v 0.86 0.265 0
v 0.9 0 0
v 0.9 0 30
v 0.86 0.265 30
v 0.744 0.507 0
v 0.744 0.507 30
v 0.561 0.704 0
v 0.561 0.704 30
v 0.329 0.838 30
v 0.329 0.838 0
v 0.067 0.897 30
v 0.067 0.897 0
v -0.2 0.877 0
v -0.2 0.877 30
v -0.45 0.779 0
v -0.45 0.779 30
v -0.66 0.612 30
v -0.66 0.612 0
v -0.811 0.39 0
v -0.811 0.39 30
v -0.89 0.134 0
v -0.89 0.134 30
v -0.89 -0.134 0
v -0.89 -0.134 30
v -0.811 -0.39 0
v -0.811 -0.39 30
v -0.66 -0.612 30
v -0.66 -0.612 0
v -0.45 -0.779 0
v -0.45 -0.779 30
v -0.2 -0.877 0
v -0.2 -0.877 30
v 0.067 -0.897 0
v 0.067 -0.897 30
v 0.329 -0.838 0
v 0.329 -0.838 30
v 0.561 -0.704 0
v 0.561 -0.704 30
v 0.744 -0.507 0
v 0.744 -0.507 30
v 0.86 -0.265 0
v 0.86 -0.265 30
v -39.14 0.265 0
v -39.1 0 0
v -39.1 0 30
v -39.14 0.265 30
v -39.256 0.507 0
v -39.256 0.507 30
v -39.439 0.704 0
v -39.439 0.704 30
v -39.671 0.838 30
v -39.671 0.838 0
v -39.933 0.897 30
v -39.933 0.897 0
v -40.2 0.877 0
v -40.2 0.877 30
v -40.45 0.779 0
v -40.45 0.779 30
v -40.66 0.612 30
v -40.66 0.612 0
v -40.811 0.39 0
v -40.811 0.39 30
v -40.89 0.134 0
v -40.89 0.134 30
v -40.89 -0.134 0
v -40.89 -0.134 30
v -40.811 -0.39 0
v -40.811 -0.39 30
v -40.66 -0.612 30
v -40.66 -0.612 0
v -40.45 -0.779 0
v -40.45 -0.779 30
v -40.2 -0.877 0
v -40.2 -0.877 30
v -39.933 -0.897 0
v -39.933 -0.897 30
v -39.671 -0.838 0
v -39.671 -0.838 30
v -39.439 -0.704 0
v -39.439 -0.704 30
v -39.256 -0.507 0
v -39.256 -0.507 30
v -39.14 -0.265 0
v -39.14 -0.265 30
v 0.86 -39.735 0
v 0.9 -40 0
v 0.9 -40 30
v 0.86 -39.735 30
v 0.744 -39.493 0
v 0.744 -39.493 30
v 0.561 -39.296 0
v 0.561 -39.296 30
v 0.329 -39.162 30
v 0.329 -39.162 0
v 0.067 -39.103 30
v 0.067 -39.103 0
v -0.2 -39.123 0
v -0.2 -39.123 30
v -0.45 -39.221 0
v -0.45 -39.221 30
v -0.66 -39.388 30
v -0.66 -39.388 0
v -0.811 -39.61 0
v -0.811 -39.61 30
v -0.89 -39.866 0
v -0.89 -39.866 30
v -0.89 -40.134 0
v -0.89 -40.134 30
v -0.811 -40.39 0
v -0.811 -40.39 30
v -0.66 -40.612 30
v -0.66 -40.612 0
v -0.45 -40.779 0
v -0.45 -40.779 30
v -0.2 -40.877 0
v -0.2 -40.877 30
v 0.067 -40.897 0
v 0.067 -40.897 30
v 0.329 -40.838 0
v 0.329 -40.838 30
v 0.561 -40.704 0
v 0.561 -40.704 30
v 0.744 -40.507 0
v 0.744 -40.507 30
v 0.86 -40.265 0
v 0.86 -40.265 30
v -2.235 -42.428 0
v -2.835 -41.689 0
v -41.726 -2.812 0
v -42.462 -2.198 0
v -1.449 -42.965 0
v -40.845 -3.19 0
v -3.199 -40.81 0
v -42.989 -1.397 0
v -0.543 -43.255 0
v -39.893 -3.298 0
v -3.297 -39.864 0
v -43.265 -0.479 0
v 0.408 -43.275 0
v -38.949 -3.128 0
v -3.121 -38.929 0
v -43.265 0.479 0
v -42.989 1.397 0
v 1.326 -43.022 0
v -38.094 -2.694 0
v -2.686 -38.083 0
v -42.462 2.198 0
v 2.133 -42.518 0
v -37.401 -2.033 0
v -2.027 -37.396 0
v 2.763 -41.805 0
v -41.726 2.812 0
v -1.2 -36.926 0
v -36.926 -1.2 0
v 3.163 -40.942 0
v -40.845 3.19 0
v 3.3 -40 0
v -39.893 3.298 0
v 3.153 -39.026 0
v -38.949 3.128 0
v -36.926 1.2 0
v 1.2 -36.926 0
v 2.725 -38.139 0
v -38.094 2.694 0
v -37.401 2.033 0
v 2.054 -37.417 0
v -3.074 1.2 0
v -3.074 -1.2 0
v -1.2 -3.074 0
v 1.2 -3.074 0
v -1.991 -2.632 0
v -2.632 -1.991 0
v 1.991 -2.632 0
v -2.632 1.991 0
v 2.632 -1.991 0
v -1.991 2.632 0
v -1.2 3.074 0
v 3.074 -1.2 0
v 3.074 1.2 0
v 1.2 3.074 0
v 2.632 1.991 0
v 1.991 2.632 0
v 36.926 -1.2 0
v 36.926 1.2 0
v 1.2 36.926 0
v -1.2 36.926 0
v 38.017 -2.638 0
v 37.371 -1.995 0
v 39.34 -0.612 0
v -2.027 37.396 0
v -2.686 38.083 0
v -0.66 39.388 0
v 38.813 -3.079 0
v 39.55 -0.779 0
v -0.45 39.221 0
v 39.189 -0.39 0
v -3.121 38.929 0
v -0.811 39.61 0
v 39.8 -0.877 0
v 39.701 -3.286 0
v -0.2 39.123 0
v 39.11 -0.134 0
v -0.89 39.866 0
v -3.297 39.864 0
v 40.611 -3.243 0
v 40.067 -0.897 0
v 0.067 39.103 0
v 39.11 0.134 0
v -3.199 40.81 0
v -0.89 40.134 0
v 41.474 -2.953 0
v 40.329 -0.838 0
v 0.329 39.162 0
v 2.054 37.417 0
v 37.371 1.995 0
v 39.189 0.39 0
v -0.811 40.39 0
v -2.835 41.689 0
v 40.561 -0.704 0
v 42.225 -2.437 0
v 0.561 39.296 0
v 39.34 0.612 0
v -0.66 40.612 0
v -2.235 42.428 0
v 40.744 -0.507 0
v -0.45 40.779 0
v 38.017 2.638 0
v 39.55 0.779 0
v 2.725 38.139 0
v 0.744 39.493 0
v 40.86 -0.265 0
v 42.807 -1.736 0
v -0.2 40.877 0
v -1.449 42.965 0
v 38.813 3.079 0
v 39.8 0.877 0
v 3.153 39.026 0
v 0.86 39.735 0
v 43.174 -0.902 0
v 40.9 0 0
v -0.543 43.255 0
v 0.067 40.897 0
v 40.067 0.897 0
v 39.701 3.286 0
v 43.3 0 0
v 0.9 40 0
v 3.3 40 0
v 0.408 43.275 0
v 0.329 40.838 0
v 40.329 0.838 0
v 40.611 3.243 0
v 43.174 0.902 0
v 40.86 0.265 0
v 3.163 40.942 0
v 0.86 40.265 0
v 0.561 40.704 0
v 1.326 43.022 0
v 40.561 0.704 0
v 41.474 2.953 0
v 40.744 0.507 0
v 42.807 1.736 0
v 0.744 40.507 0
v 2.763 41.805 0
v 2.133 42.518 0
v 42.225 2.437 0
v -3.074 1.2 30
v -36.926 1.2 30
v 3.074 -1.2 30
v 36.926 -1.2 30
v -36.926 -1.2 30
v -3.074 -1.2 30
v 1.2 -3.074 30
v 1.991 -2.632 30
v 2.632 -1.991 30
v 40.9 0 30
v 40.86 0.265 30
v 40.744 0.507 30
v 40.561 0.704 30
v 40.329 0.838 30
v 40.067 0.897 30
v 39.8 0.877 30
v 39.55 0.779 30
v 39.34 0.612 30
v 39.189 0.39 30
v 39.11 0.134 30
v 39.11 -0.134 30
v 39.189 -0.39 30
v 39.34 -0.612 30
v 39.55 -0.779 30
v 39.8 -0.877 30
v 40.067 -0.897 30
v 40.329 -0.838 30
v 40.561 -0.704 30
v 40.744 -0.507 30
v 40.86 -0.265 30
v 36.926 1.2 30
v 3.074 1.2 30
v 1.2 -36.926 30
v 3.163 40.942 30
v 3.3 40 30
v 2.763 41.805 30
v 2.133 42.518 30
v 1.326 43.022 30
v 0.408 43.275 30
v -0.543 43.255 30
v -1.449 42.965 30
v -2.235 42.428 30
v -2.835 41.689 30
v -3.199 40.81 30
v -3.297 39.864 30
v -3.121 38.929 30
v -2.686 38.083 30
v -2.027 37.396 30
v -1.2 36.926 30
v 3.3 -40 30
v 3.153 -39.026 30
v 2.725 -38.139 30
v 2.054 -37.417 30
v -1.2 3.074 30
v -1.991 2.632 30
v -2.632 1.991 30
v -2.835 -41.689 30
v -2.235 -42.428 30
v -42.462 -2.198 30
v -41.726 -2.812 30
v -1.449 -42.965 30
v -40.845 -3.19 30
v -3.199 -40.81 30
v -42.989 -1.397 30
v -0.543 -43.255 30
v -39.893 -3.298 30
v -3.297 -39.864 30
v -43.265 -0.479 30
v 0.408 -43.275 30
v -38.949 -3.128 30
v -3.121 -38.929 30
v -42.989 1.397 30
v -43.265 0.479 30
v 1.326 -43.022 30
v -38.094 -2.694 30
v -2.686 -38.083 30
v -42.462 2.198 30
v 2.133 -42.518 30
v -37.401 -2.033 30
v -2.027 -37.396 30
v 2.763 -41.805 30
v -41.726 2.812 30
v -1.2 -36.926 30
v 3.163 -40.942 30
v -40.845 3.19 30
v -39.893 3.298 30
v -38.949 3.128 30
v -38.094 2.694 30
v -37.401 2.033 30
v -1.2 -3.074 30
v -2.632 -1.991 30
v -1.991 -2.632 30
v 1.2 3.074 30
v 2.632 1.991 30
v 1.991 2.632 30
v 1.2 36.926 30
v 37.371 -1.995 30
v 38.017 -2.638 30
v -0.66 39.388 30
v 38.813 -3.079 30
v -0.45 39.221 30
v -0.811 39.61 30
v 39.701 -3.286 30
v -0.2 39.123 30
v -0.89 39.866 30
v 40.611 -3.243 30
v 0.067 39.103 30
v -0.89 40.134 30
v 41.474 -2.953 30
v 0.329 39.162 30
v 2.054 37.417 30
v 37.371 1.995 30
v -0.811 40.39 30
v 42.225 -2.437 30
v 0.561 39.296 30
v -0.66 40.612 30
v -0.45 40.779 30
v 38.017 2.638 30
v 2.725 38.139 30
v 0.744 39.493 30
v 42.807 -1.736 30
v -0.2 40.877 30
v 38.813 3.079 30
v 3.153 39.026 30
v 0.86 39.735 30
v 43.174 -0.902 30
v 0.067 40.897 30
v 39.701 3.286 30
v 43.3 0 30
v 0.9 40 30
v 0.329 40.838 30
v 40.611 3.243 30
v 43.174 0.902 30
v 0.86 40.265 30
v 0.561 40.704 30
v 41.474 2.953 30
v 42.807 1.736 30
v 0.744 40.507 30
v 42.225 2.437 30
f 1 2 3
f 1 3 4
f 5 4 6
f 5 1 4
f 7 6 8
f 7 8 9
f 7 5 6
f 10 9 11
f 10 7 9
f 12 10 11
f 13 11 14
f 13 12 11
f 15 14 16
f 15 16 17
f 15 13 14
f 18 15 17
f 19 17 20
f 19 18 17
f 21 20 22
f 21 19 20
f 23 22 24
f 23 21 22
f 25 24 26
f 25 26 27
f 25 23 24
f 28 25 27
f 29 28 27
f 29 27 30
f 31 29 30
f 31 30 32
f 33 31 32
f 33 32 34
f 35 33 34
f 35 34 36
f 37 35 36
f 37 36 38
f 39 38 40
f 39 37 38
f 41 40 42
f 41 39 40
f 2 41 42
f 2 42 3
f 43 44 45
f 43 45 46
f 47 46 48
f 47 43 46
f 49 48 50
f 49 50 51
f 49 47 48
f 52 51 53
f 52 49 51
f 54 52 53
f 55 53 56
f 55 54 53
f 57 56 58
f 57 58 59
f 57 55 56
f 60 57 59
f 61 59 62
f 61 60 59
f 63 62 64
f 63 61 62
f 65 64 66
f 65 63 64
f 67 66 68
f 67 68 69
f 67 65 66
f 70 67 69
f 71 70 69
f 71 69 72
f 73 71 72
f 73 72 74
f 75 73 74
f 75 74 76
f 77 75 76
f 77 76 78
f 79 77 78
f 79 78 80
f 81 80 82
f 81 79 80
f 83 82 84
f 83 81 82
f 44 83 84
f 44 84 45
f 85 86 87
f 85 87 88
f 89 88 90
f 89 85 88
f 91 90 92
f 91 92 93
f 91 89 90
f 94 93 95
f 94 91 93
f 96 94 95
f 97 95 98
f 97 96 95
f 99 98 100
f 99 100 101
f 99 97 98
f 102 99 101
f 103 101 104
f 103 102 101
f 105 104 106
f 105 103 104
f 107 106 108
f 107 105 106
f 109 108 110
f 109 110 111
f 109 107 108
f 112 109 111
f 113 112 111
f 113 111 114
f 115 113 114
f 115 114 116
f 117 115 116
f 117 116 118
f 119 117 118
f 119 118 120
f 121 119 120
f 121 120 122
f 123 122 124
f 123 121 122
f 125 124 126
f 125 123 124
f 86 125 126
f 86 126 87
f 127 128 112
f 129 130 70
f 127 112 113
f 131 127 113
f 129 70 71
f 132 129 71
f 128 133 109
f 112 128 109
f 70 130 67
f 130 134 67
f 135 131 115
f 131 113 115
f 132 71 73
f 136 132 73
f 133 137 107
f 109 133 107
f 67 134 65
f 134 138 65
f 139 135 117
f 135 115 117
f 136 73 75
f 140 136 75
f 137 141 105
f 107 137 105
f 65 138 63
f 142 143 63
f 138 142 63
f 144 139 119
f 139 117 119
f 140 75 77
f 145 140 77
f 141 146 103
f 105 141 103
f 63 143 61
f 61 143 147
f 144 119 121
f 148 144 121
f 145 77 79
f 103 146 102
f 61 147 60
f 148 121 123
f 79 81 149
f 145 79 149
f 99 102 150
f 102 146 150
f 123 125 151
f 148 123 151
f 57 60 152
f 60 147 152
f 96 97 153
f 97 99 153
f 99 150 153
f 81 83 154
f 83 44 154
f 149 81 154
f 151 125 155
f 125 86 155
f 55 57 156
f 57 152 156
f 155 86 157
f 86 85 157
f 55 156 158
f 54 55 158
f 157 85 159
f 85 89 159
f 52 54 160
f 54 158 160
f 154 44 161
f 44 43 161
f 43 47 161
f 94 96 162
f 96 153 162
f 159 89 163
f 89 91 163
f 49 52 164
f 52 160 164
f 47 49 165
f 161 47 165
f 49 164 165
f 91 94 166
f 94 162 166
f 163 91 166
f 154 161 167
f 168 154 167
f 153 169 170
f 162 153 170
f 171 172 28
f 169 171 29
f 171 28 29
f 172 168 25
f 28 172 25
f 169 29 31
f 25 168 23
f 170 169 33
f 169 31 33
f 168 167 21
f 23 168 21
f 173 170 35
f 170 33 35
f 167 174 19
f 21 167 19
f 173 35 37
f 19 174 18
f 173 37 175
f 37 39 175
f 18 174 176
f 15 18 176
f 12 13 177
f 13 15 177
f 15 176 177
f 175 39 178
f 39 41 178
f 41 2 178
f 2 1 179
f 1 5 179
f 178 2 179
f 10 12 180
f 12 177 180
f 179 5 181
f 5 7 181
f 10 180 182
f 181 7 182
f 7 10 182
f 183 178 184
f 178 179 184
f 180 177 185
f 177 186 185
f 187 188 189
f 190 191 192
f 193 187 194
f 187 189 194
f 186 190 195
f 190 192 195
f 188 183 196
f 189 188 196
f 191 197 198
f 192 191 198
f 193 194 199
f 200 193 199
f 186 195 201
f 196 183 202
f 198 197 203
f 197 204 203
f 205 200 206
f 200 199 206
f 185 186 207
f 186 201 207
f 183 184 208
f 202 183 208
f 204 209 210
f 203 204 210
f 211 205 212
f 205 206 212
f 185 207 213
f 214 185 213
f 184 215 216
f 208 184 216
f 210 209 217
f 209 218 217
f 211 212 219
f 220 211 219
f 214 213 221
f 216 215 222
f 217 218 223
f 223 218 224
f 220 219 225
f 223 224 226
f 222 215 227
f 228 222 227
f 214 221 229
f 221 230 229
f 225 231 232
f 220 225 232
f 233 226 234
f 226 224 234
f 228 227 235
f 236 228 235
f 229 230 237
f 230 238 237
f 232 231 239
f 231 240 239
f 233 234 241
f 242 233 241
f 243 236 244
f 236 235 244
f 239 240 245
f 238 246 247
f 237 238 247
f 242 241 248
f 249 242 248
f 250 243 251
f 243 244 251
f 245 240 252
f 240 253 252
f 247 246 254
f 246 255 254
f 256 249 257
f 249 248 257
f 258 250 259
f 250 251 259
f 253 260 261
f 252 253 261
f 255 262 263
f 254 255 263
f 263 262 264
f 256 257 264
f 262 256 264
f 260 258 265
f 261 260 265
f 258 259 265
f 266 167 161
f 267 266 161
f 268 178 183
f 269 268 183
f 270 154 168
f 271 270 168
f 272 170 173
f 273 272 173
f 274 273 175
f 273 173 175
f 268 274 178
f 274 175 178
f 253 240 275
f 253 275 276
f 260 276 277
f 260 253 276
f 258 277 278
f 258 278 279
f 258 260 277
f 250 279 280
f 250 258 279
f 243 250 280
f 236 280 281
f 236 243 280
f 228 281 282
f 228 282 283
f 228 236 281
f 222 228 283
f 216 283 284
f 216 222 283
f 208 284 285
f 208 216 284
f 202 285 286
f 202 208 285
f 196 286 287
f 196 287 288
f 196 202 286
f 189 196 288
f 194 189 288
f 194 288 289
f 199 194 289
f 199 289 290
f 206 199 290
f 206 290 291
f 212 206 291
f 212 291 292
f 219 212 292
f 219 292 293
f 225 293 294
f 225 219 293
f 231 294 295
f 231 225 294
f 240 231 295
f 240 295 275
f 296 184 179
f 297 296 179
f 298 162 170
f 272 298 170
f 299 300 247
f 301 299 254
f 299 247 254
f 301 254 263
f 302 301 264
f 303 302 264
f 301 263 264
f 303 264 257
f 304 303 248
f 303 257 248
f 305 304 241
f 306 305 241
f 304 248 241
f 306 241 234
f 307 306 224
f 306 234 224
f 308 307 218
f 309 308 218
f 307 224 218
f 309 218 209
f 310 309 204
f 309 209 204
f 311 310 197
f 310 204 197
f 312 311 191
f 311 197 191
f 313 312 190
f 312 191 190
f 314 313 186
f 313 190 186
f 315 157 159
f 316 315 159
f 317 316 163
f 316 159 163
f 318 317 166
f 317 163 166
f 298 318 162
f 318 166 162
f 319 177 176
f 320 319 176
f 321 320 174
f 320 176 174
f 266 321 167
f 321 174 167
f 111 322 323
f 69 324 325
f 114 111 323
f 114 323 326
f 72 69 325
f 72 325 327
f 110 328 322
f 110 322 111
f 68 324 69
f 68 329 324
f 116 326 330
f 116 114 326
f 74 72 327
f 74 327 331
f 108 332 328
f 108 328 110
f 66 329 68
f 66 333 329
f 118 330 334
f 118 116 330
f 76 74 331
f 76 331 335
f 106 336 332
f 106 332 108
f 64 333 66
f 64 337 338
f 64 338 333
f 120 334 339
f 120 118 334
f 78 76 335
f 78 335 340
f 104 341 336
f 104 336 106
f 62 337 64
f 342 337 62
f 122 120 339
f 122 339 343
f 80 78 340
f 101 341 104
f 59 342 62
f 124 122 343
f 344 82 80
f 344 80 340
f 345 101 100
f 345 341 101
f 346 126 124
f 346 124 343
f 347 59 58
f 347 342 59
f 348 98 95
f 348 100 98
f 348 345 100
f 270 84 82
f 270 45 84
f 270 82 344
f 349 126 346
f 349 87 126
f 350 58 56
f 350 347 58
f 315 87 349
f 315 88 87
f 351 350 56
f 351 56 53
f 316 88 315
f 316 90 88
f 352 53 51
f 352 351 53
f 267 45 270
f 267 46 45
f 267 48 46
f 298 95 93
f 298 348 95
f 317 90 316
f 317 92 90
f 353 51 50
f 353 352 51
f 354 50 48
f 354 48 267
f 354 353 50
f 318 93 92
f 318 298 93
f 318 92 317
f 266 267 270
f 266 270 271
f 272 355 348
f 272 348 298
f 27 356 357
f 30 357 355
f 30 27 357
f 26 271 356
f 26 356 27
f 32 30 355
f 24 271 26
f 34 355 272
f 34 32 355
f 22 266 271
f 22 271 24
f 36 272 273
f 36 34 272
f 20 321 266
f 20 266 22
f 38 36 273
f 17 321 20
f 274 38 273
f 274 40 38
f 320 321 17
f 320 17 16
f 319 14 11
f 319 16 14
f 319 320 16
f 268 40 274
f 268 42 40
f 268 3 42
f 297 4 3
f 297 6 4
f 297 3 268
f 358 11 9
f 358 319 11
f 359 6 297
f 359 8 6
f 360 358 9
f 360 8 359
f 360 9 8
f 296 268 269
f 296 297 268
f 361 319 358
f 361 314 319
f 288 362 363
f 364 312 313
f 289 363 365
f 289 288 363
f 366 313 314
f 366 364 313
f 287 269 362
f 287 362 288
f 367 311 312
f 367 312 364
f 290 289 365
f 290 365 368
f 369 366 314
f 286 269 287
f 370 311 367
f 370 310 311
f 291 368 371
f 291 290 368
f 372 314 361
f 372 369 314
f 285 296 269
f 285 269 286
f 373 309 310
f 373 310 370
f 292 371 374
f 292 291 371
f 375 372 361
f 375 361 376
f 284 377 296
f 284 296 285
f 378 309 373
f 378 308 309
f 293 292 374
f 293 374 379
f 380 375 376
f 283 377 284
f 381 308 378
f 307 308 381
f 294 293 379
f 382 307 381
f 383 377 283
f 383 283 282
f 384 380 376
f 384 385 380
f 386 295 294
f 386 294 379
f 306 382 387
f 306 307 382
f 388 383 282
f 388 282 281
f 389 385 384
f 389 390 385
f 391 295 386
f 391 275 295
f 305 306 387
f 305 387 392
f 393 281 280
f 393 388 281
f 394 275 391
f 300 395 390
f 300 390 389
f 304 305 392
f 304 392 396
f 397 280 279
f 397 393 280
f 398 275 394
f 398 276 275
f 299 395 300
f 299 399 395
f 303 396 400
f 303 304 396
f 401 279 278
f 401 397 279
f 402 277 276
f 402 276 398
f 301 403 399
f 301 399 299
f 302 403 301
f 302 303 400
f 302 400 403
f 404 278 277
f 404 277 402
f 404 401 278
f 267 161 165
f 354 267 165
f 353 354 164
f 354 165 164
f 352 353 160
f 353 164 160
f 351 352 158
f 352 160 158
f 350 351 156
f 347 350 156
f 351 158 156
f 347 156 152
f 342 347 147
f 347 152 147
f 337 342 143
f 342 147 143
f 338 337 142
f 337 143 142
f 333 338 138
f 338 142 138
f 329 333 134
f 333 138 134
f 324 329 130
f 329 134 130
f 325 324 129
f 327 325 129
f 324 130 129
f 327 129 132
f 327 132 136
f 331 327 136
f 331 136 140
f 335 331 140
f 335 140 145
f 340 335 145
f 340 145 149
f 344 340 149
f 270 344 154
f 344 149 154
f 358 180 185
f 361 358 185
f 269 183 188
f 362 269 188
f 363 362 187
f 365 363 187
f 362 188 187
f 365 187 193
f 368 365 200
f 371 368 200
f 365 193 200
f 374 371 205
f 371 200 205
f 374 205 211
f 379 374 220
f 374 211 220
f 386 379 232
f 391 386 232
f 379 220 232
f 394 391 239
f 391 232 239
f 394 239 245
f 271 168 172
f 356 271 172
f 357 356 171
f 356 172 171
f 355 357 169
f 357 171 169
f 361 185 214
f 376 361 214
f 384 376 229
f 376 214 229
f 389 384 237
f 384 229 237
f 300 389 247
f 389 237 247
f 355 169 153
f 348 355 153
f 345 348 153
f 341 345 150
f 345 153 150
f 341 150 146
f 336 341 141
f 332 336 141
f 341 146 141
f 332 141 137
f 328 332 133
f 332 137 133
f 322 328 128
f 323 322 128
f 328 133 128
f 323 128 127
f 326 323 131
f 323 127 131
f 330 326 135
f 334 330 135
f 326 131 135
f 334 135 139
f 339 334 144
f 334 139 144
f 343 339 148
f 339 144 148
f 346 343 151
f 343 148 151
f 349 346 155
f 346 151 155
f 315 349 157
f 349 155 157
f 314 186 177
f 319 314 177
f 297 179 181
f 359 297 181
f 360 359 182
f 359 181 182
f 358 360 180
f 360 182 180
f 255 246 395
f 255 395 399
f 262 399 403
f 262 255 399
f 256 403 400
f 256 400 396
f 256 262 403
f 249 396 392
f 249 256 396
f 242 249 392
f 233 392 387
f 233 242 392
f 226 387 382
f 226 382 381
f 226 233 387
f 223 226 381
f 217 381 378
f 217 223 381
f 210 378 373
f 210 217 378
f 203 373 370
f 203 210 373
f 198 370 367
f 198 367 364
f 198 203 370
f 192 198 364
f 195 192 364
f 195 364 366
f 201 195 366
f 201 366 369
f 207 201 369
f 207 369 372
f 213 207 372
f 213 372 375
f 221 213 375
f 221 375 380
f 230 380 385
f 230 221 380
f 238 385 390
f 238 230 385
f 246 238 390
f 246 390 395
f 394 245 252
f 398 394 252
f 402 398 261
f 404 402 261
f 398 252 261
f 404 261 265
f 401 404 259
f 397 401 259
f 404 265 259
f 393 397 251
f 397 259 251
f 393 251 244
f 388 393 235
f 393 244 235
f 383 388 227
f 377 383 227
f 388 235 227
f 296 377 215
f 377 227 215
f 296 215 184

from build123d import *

# Parameters (mm, degrees)
BOSS_EXTRUDE1_DEPTH = 30
SKETCH1_3_R         = 0.9
CUT_EXTRUDE1_DEPTH  = 30


with BuildPart() as part:
    # Sketch1 → Boss-Extrude1 (new body)
    with BuildSketch(Plane.XY):
        with BuildLine():
            Line((-1.2, -1.2), (-1.2, 0))
            Line((-1.2, 0), (-1.2, 1.2))
            Line((-1.2, 1.2), (-3.07408523, 1.2))
            ThreePointArc((-3.07408523, 1.2), (-3.3, 0), (-3.07408523, -1.2))
            Line((-3.07408523, -1.2), (-1.2, -1.2))
        make_face()
        with BuildLine():
            ThreePointArc((0, -1.2), (-0.848528137, -0.848528137), (-1.2, 0))
            Line((-1.2, 0), (-1.2, -1.2))
            Line((-1.2, -1.2), (0, -1.2))
        make_face()
        with BuildLine():
            ThreePointArc((0, 1.2), (-0.848528137, 0.848528137), (-1.2, 0))
            ThreePointArc((-1.2, 0), (-0.848528137, -0.848528137), (0, -1.2))
            ThreePointArc((0, -1.2), (0.848528137, -0.848528137), (1.2, 0))
            ThreePointArc((1.2, 0), (0.848528137, 0.848528137), (0, 1.2))
        make_face()
        with BuildLine():
            Line((-1.2, 1.2), (-1.2, 0))
            ThreePointArc((-1.2, 0), (-0.848528137, 0.848528137), (0, 1.2))
            Line((0, 1.2), (-1.2, 1.2))
        make_face()
        with BuildLine():
            Line((-3.07408523, 1.2), (-1.2, 1.2))
            Line((-1.2, 1.2), (-1.2, 3.07408523))
            ThreePointArc((-1.2, 3.07408523), (-2.333452378, 2.333452378), (-3.07408523, 1.2))
        make_face()
        with BuildLine():
            Line((-1.2, 3.07408523), (-1.2, 1.2))
            Line((-1.2, 1.2), (0, 1.2))
            Line((0, 1.2), (1.2, 1.2))
            Line((1.2, 1.2), (1.2, 3.07408523))
            ThreePointArc((1.2, 3.07408523), (0, 3.3), (-1.2, 3.07408523))
        make_face()
        with BuildLine():
            Line((0, -1.2), (-1.2, -1.2))
            Line((-1.2, -1.2), (-1.2, -3.07408523))
            ThreePointArc((-1.2, -3.07408523), (0, -3.3), (1.2, -3.07408523))
            Line((1.2, -3.07408523), (1.2, -1.2))
            Line((1.2, -1.2), (0, -1.2))
        make_face()
        with BuildLine():
            Line((-1.2, -3.07408523), (-1.2, -1.2))
            Line((-1.2, -1.2), (-3.07408523, -1.2))
            ThreePointArc((-3.07408523, -1.2), (-2.333452378, -2.333452378), (-1.2, -3.07408523))
        make_face()
        with BuildLine():
            ThreePointArc((1.2, 0), (0.848528137, -0.848528137), (0, -1.2))
            Line((0, -1.2), (1.2, -1.2))
            Line((1.2, -1.2), (1.2, 0))
        make_face()
        with BuildLine():
            Line((1.2, 1.2), (0, 1.2))
            ThreePointArc((0, 1.2), (0.848528137, 0.848528137), (1.2, 0))
            Line((1.2, 0), (1.2, 1.2))
        make_face()
        with BuildLine():
            Line((-1.2, 36.92591477), (-1.2, 3.07408523))
            ThreePointArc((-1.2, 3.07408523), (0, 3.3), (1.2, 3.07408523))
            Line((1.2, 3.07408523), (1.2, 36.92591477))
            ThreePointArc((1.2, 36.92591477), (0, 36.7), (-1.2, 36.92591477))
        make_face()
        with BuildLine():
            ThreePointArc((-3.07408523, -1.2), (-3.3, 0), (-3.07408523, 1.2))
            Line((-3.07408523, 1.2), (-36.92591477, 1.2))
            ThreePointArc((-36.92591477, 1.2), (-36.756970455, 0.610540229), (-36.7, 0))
            ThreePointArc((-36.7, 0), (-36.756970455, -0.610540229), (-36.92591477, -1.2))
            Line((-36.92591477, -1.2), (-3.07408523, -1.2))
        make_face()
        with BuildLine():
            ThreePointArc((1.2, -3.07408523), (0, -3.3), (-1.2, -3.07408523))
            Line((-1.2, -3.07408523), (-1.2, -36.92591477))
            ThreePointArc((-1.2, -36.92591477), (0, -36.7), (1.2, -36.92591477))
            Line((1.2, -36.92591477), (1.2, -3.07408523))
        make_face()
        with BuildLine():
            Line((1.2, 0), (1.2, -1.2))
            Line((1.2, -1.2), (3.07408523, -1.2))
            ThreePointArc((3.07408523, -1.2), (3.243029545, -0.610540229), (3.3, 0))
            ThreePointArc((3.3, 0), (3.243029545, 0.610540229), (3.07408523, 1.2))
            Line((3.07408523, 1.2), (1.2, 1.2))
            Line((1.2, 1.2), (1.2, 0))
        make_face()
        with BuildLine():
            Line((3.07408523, -1.2), (1.2, -1.2))
            Line((1.2, -1.2), (1.2, -3.07408523))
            ThreePointArc((1.2, -3.07408523), (2.333452378, -2.333452378), (3.07408523, -1.2))
        make_face()
        with BuildLine():
            Line((1.2, 3.07408523), (1.2, 1.2))
            Line((1.2, 1.2), (3.07408523, 1.2))
            ThreePointArc((3.07408523, 1.2), (2.333452378, 2.333452378), (1.2, 3.07408523))
        make_face()
        with BuildLine():
            ThreePointArc((3.3, 40), (-1.861451047, 42.724885319), (-1.2, 36.92591477))
            Line((-1.2, 36.92591477), (-1.2, 40))
            ThreePointArc((-1.2, 40), (0, 41.2), (1.2, 40))
            Line((1.2, 40), (1.2, 36.92591477))
            ThreePointArc((1.2, 36.92591477), (2.724885319, 38.138548953), (3.3, 40))
        make_face()
        with BuildLine():
            Line((-1.2, 40), (-1.2, 36.92591477))
            ThreePointArc((-1.2, 36.92591477), (0, 36.7), (1.2, 36.92591477))
            Line((1.2, 36.92591477), (1.2, 40))
            ThreePointArc((1.2, 40), (0, 41.2), (-1.2, 40))
        make_face()
        with BuildLine():
            ThreePointArc((-36.7, 0), (-36.756970455, 0.610540229), (-36.92591477, 1.2))
            Line((-36.92591477, 1.2), (-40, 1.2))
            ThreePointArc((-40, 1.2), (-41.2, 0), (-40, -1.2))
            Line((-40, -1.2), (-36.92591477, -1.2))
            ThreePointArc((-36.92591477, -1.2), (-36.756970455, -0.610540229), (-36.7, 0))
        make_face()
        with BuildLine():
            Line((-40, 1.2), (-36.92591477, 1.2))
            ThreePointArc((-36.92591477, 1.2), (-43.3, 0), (-36.92591477, -1.2))
            Line((-36.92591477, -1.2), (-40, -1.2))
            ThreePointArc((-40, -1.2), (-41.2, 0), (-40, 1.2))
        make_face()
        with BuildLine():
            ThreePointArc((1.2, -36.92591477), (0, -36.7), (-1.2, -36.92591477))
            Line((-1.2, -36.92591477), (-1.2, -40))
            ThreePointArc((-1.2, -40), (0, -41.2), (1.2, -40))
            Line((1.2, -40), (1.2, -36.92591477))
        make_face()
        with BuildLine():
            Line((-1.2, -40), (-1.2, -36.92591477))
            ThreePointArc((-1.2, -36.92591477), (-1.861451047, -42.724885319), (3.3, -40))
            ThreePointArc((3.3, -40), (2.724885319, -38.138548953), (1.2, -36.92591477))
            Line((1.2, -36.92591477), (1.2, -40))
            ThreePointArc((1.2, -40), (0, -41.2), (-1.2, -40))
        make_face()
        with BuildLine():
            ThreePointArc((3.3, 0), (3.243029545, -0.610540229), (3.07408523, -1.2))
            Line((3.07408523, -1.2), (36.92591477, -1.2))
            ThreePointArc((36.92591477, -1.2), (36.7, 0), (36.92591477, 1.2))
            Line((36.92591477, 1.2), (3.07408523, 1.2))
            ThreePointArc((3.07408523, 1.2), (3.243029545, 0.610540229), (3.3, 0))
        make_face()
        with BuildLine():
            ThreePointArc((36.92591477, 1.2), (36.7, 0), (36.92591477, -1.2))
            Line((36.92591477, -1.2), (40, -1.2))
            ThreePointArc((40, -1.2), (41.2, 0), (40, 1.2))
            Line((40, 1.2), (36.92591477, 1.2))
        make_face()
        with BuildLine():
            Line((40, -1.2), (36.92591477, -1.2))
            ThreePointArc((36.92591477, -1.2), (40.610540229, -3.243029545), (43.3, 0))
            ThreePointArc((43.3, 0), (40.610540229, 3.243029545), (36.92591477, 1.2))
            Line((36.92591477, 1.2), (40, 1.2))
            ThreePointArc((40, 1.2), (41.2, 0), (40, -1.2))
        make_face()
    extrude(amount=BOSS_EXTRUDE1_DEPTH)

    # Sketch1<3> → Cut-Extrude1 (cut)
    with BuildSketch(Plane.XY):
        Circle(SKETCH1_3_R)
        with Locations((0, 40)):
            Circle(SKETCH1_3_R)
        with Locations((40, 0)):
            Circle(SKETCH1_3_R)
        with Locations((0, -40)):
            Circle(SKETCH1_3_R)
        with Locations((-40, 0)):
            Circle(SKETCH1_3_R)
    extrude(amount=CUT_EXTRUDE1_DEPTH, mode=Mode.SUBTRACT)


solid = part.part
